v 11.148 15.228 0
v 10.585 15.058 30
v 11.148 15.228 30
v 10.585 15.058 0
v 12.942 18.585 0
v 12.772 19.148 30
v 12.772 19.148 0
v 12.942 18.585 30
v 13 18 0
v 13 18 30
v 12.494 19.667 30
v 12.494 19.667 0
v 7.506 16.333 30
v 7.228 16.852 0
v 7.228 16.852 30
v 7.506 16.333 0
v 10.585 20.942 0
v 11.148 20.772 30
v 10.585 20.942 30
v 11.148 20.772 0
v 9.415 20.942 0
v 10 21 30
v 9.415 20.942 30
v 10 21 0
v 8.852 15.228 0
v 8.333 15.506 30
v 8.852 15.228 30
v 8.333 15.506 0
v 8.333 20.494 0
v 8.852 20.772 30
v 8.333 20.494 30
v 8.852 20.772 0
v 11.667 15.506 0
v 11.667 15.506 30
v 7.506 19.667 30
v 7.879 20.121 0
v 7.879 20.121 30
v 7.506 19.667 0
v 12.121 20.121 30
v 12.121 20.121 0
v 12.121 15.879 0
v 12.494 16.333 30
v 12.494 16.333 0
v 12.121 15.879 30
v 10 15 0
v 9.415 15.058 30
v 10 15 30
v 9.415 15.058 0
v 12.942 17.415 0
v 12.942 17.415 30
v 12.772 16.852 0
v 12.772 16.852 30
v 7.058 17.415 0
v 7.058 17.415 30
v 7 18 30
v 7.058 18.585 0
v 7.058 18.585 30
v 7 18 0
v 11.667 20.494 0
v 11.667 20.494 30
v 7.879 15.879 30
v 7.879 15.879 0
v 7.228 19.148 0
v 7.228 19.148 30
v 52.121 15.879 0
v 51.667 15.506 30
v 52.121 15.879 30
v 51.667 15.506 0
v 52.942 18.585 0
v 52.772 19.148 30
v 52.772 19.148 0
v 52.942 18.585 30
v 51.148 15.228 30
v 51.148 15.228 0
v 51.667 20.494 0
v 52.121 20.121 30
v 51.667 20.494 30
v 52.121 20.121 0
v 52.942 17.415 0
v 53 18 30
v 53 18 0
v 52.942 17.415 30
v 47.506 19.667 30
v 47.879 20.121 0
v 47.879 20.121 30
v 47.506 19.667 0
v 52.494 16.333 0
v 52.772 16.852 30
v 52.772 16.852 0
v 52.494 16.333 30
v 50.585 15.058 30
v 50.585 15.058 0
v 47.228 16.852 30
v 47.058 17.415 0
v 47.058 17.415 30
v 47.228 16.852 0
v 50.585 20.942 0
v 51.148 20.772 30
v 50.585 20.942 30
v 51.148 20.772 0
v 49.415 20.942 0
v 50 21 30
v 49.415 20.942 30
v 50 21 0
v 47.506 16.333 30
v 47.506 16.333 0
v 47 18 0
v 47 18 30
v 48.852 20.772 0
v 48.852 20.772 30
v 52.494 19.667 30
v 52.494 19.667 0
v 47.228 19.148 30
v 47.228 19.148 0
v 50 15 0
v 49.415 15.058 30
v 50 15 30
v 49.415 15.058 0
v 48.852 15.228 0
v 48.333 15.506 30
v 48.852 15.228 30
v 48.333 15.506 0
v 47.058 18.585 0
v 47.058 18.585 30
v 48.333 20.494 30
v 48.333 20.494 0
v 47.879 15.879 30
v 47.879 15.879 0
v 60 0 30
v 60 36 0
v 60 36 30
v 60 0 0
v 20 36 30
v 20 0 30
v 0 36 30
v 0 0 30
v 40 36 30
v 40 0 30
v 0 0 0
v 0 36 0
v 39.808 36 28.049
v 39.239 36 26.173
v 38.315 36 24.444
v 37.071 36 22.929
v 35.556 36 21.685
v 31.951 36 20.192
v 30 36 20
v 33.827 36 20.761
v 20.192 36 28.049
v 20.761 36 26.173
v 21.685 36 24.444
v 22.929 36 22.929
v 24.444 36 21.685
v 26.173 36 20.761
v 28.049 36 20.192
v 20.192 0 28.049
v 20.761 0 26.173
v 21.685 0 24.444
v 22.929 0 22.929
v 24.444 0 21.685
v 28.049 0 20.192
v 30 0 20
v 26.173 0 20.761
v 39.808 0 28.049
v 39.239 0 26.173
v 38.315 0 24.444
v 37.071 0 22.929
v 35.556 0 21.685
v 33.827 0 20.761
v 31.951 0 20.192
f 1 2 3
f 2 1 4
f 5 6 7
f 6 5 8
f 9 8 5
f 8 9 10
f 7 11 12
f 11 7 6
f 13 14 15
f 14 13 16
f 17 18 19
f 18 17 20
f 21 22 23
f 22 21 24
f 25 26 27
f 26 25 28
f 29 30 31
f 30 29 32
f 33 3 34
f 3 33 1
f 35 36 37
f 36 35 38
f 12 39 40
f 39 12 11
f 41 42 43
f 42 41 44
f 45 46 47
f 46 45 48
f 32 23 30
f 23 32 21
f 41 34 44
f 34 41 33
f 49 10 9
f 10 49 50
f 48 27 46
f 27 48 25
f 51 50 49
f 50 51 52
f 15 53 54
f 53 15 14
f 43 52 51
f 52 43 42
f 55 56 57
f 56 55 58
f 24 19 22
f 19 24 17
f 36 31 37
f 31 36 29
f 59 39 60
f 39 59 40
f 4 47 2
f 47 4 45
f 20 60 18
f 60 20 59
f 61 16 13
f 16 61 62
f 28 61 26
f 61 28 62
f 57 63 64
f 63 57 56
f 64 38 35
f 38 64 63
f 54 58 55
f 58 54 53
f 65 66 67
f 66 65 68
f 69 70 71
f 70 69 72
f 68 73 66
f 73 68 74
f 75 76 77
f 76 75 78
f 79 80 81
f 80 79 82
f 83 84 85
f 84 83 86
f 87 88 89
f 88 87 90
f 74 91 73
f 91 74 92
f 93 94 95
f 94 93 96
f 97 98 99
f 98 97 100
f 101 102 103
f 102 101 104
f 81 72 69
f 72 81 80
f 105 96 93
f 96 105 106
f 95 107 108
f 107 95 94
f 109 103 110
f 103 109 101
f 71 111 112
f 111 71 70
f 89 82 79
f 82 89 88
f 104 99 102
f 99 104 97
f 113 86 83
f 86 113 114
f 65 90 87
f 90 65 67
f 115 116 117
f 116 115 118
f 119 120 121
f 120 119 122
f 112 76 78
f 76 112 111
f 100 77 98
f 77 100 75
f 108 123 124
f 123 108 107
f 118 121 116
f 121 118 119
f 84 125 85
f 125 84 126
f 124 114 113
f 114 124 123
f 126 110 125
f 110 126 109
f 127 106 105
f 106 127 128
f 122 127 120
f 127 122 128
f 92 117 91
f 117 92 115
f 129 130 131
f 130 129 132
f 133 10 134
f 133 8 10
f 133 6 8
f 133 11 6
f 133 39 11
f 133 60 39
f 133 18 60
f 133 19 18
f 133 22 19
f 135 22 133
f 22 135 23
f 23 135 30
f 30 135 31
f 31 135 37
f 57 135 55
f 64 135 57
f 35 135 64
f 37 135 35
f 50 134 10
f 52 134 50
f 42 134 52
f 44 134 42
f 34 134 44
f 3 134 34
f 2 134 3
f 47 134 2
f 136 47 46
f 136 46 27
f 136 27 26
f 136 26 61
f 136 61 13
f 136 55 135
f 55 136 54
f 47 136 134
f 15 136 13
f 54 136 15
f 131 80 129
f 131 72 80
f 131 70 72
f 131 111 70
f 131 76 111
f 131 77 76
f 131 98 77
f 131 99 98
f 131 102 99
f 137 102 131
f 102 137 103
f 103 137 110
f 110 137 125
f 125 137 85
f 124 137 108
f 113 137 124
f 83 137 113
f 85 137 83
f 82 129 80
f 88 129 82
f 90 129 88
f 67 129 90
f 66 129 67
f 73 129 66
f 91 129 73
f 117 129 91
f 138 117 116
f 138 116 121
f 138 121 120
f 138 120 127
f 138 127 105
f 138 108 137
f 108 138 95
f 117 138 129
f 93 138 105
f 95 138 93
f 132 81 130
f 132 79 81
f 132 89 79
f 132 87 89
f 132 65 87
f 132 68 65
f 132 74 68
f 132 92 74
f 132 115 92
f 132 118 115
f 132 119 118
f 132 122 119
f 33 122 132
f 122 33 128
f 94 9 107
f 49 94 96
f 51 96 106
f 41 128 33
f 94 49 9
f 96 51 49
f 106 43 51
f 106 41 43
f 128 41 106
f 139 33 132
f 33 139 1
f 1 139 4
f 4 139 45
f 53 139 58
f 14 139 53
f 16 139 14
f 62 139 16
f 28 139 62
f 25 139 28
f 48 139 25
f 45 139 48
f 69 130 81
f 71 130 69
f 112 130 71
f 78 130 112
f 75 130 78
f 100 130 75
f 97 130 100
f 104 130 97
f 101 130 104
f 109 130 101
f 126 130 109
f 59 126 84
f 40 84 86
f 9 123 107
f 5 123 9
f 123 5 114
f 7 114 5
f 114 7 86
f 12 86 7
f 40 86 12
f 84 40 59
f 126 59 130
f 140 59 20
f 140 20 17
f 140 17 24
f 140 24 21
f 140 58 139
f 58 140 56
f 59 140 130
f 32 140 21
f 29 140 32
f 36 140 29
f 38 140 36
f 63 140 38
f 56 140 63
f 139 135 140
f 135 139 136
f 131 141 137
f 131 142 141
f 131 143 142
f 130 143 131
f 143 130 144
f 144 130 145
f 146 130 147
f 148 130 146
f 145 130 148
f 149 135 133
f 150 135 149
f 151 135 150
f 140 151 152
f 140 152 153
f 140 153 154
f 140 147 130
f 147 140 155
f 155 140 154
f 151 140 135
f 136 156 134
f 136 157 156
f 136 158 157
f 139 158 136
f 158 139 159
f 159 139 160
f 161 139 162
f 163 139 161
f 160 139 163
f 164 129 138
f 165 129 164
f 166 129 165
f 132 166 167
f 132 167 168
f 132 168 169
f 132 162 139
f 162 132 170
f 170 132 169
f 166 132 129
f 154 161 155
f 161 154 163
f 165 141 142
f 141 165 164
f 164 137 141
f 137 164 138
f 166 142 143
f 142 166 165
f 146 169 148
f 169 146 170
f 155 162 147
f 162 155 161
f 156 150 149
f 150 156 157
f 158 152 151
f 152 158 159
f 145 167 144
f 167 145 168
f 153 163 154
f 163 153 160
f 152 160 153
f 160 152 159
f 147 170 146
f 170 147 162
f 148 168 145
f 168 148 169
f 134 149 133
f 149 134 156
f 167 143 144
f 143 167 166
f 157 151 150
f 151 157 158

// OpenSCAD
$fn = 32;

// ----------------------------------------------------------------------
// Saddle clamp: plain shaft clamp
// ----------------------------------------------------------------------

// --- parameters (mm) ---
blk_l = 60;               // block length, X
blk_w = 36;               // block width, Y
blk_h = 30;               // block height
clamp_r = 10;             // shaft groove radius
hole_r = 3;               // bolt hole radius
hole_m = 10;              // bolt hole margin from the ends

saw_depth = clamp_r + 3;  // saw kerf depth

difference() {
  cube([blk_l, blk_w, blk_h]);
  translate([blk_l / 2, -1, blk_h])
    rotate([-90, 0, 0])
      cylinder(h = blk_w + 2, r = clamp_r);
  for (sx = [0, 1])
    translate([sx ? blk_l - hole_m : hole_m, blk_w / 2, -1])
      cylinder(r = hole_r, h = blk_h + 2);
}
